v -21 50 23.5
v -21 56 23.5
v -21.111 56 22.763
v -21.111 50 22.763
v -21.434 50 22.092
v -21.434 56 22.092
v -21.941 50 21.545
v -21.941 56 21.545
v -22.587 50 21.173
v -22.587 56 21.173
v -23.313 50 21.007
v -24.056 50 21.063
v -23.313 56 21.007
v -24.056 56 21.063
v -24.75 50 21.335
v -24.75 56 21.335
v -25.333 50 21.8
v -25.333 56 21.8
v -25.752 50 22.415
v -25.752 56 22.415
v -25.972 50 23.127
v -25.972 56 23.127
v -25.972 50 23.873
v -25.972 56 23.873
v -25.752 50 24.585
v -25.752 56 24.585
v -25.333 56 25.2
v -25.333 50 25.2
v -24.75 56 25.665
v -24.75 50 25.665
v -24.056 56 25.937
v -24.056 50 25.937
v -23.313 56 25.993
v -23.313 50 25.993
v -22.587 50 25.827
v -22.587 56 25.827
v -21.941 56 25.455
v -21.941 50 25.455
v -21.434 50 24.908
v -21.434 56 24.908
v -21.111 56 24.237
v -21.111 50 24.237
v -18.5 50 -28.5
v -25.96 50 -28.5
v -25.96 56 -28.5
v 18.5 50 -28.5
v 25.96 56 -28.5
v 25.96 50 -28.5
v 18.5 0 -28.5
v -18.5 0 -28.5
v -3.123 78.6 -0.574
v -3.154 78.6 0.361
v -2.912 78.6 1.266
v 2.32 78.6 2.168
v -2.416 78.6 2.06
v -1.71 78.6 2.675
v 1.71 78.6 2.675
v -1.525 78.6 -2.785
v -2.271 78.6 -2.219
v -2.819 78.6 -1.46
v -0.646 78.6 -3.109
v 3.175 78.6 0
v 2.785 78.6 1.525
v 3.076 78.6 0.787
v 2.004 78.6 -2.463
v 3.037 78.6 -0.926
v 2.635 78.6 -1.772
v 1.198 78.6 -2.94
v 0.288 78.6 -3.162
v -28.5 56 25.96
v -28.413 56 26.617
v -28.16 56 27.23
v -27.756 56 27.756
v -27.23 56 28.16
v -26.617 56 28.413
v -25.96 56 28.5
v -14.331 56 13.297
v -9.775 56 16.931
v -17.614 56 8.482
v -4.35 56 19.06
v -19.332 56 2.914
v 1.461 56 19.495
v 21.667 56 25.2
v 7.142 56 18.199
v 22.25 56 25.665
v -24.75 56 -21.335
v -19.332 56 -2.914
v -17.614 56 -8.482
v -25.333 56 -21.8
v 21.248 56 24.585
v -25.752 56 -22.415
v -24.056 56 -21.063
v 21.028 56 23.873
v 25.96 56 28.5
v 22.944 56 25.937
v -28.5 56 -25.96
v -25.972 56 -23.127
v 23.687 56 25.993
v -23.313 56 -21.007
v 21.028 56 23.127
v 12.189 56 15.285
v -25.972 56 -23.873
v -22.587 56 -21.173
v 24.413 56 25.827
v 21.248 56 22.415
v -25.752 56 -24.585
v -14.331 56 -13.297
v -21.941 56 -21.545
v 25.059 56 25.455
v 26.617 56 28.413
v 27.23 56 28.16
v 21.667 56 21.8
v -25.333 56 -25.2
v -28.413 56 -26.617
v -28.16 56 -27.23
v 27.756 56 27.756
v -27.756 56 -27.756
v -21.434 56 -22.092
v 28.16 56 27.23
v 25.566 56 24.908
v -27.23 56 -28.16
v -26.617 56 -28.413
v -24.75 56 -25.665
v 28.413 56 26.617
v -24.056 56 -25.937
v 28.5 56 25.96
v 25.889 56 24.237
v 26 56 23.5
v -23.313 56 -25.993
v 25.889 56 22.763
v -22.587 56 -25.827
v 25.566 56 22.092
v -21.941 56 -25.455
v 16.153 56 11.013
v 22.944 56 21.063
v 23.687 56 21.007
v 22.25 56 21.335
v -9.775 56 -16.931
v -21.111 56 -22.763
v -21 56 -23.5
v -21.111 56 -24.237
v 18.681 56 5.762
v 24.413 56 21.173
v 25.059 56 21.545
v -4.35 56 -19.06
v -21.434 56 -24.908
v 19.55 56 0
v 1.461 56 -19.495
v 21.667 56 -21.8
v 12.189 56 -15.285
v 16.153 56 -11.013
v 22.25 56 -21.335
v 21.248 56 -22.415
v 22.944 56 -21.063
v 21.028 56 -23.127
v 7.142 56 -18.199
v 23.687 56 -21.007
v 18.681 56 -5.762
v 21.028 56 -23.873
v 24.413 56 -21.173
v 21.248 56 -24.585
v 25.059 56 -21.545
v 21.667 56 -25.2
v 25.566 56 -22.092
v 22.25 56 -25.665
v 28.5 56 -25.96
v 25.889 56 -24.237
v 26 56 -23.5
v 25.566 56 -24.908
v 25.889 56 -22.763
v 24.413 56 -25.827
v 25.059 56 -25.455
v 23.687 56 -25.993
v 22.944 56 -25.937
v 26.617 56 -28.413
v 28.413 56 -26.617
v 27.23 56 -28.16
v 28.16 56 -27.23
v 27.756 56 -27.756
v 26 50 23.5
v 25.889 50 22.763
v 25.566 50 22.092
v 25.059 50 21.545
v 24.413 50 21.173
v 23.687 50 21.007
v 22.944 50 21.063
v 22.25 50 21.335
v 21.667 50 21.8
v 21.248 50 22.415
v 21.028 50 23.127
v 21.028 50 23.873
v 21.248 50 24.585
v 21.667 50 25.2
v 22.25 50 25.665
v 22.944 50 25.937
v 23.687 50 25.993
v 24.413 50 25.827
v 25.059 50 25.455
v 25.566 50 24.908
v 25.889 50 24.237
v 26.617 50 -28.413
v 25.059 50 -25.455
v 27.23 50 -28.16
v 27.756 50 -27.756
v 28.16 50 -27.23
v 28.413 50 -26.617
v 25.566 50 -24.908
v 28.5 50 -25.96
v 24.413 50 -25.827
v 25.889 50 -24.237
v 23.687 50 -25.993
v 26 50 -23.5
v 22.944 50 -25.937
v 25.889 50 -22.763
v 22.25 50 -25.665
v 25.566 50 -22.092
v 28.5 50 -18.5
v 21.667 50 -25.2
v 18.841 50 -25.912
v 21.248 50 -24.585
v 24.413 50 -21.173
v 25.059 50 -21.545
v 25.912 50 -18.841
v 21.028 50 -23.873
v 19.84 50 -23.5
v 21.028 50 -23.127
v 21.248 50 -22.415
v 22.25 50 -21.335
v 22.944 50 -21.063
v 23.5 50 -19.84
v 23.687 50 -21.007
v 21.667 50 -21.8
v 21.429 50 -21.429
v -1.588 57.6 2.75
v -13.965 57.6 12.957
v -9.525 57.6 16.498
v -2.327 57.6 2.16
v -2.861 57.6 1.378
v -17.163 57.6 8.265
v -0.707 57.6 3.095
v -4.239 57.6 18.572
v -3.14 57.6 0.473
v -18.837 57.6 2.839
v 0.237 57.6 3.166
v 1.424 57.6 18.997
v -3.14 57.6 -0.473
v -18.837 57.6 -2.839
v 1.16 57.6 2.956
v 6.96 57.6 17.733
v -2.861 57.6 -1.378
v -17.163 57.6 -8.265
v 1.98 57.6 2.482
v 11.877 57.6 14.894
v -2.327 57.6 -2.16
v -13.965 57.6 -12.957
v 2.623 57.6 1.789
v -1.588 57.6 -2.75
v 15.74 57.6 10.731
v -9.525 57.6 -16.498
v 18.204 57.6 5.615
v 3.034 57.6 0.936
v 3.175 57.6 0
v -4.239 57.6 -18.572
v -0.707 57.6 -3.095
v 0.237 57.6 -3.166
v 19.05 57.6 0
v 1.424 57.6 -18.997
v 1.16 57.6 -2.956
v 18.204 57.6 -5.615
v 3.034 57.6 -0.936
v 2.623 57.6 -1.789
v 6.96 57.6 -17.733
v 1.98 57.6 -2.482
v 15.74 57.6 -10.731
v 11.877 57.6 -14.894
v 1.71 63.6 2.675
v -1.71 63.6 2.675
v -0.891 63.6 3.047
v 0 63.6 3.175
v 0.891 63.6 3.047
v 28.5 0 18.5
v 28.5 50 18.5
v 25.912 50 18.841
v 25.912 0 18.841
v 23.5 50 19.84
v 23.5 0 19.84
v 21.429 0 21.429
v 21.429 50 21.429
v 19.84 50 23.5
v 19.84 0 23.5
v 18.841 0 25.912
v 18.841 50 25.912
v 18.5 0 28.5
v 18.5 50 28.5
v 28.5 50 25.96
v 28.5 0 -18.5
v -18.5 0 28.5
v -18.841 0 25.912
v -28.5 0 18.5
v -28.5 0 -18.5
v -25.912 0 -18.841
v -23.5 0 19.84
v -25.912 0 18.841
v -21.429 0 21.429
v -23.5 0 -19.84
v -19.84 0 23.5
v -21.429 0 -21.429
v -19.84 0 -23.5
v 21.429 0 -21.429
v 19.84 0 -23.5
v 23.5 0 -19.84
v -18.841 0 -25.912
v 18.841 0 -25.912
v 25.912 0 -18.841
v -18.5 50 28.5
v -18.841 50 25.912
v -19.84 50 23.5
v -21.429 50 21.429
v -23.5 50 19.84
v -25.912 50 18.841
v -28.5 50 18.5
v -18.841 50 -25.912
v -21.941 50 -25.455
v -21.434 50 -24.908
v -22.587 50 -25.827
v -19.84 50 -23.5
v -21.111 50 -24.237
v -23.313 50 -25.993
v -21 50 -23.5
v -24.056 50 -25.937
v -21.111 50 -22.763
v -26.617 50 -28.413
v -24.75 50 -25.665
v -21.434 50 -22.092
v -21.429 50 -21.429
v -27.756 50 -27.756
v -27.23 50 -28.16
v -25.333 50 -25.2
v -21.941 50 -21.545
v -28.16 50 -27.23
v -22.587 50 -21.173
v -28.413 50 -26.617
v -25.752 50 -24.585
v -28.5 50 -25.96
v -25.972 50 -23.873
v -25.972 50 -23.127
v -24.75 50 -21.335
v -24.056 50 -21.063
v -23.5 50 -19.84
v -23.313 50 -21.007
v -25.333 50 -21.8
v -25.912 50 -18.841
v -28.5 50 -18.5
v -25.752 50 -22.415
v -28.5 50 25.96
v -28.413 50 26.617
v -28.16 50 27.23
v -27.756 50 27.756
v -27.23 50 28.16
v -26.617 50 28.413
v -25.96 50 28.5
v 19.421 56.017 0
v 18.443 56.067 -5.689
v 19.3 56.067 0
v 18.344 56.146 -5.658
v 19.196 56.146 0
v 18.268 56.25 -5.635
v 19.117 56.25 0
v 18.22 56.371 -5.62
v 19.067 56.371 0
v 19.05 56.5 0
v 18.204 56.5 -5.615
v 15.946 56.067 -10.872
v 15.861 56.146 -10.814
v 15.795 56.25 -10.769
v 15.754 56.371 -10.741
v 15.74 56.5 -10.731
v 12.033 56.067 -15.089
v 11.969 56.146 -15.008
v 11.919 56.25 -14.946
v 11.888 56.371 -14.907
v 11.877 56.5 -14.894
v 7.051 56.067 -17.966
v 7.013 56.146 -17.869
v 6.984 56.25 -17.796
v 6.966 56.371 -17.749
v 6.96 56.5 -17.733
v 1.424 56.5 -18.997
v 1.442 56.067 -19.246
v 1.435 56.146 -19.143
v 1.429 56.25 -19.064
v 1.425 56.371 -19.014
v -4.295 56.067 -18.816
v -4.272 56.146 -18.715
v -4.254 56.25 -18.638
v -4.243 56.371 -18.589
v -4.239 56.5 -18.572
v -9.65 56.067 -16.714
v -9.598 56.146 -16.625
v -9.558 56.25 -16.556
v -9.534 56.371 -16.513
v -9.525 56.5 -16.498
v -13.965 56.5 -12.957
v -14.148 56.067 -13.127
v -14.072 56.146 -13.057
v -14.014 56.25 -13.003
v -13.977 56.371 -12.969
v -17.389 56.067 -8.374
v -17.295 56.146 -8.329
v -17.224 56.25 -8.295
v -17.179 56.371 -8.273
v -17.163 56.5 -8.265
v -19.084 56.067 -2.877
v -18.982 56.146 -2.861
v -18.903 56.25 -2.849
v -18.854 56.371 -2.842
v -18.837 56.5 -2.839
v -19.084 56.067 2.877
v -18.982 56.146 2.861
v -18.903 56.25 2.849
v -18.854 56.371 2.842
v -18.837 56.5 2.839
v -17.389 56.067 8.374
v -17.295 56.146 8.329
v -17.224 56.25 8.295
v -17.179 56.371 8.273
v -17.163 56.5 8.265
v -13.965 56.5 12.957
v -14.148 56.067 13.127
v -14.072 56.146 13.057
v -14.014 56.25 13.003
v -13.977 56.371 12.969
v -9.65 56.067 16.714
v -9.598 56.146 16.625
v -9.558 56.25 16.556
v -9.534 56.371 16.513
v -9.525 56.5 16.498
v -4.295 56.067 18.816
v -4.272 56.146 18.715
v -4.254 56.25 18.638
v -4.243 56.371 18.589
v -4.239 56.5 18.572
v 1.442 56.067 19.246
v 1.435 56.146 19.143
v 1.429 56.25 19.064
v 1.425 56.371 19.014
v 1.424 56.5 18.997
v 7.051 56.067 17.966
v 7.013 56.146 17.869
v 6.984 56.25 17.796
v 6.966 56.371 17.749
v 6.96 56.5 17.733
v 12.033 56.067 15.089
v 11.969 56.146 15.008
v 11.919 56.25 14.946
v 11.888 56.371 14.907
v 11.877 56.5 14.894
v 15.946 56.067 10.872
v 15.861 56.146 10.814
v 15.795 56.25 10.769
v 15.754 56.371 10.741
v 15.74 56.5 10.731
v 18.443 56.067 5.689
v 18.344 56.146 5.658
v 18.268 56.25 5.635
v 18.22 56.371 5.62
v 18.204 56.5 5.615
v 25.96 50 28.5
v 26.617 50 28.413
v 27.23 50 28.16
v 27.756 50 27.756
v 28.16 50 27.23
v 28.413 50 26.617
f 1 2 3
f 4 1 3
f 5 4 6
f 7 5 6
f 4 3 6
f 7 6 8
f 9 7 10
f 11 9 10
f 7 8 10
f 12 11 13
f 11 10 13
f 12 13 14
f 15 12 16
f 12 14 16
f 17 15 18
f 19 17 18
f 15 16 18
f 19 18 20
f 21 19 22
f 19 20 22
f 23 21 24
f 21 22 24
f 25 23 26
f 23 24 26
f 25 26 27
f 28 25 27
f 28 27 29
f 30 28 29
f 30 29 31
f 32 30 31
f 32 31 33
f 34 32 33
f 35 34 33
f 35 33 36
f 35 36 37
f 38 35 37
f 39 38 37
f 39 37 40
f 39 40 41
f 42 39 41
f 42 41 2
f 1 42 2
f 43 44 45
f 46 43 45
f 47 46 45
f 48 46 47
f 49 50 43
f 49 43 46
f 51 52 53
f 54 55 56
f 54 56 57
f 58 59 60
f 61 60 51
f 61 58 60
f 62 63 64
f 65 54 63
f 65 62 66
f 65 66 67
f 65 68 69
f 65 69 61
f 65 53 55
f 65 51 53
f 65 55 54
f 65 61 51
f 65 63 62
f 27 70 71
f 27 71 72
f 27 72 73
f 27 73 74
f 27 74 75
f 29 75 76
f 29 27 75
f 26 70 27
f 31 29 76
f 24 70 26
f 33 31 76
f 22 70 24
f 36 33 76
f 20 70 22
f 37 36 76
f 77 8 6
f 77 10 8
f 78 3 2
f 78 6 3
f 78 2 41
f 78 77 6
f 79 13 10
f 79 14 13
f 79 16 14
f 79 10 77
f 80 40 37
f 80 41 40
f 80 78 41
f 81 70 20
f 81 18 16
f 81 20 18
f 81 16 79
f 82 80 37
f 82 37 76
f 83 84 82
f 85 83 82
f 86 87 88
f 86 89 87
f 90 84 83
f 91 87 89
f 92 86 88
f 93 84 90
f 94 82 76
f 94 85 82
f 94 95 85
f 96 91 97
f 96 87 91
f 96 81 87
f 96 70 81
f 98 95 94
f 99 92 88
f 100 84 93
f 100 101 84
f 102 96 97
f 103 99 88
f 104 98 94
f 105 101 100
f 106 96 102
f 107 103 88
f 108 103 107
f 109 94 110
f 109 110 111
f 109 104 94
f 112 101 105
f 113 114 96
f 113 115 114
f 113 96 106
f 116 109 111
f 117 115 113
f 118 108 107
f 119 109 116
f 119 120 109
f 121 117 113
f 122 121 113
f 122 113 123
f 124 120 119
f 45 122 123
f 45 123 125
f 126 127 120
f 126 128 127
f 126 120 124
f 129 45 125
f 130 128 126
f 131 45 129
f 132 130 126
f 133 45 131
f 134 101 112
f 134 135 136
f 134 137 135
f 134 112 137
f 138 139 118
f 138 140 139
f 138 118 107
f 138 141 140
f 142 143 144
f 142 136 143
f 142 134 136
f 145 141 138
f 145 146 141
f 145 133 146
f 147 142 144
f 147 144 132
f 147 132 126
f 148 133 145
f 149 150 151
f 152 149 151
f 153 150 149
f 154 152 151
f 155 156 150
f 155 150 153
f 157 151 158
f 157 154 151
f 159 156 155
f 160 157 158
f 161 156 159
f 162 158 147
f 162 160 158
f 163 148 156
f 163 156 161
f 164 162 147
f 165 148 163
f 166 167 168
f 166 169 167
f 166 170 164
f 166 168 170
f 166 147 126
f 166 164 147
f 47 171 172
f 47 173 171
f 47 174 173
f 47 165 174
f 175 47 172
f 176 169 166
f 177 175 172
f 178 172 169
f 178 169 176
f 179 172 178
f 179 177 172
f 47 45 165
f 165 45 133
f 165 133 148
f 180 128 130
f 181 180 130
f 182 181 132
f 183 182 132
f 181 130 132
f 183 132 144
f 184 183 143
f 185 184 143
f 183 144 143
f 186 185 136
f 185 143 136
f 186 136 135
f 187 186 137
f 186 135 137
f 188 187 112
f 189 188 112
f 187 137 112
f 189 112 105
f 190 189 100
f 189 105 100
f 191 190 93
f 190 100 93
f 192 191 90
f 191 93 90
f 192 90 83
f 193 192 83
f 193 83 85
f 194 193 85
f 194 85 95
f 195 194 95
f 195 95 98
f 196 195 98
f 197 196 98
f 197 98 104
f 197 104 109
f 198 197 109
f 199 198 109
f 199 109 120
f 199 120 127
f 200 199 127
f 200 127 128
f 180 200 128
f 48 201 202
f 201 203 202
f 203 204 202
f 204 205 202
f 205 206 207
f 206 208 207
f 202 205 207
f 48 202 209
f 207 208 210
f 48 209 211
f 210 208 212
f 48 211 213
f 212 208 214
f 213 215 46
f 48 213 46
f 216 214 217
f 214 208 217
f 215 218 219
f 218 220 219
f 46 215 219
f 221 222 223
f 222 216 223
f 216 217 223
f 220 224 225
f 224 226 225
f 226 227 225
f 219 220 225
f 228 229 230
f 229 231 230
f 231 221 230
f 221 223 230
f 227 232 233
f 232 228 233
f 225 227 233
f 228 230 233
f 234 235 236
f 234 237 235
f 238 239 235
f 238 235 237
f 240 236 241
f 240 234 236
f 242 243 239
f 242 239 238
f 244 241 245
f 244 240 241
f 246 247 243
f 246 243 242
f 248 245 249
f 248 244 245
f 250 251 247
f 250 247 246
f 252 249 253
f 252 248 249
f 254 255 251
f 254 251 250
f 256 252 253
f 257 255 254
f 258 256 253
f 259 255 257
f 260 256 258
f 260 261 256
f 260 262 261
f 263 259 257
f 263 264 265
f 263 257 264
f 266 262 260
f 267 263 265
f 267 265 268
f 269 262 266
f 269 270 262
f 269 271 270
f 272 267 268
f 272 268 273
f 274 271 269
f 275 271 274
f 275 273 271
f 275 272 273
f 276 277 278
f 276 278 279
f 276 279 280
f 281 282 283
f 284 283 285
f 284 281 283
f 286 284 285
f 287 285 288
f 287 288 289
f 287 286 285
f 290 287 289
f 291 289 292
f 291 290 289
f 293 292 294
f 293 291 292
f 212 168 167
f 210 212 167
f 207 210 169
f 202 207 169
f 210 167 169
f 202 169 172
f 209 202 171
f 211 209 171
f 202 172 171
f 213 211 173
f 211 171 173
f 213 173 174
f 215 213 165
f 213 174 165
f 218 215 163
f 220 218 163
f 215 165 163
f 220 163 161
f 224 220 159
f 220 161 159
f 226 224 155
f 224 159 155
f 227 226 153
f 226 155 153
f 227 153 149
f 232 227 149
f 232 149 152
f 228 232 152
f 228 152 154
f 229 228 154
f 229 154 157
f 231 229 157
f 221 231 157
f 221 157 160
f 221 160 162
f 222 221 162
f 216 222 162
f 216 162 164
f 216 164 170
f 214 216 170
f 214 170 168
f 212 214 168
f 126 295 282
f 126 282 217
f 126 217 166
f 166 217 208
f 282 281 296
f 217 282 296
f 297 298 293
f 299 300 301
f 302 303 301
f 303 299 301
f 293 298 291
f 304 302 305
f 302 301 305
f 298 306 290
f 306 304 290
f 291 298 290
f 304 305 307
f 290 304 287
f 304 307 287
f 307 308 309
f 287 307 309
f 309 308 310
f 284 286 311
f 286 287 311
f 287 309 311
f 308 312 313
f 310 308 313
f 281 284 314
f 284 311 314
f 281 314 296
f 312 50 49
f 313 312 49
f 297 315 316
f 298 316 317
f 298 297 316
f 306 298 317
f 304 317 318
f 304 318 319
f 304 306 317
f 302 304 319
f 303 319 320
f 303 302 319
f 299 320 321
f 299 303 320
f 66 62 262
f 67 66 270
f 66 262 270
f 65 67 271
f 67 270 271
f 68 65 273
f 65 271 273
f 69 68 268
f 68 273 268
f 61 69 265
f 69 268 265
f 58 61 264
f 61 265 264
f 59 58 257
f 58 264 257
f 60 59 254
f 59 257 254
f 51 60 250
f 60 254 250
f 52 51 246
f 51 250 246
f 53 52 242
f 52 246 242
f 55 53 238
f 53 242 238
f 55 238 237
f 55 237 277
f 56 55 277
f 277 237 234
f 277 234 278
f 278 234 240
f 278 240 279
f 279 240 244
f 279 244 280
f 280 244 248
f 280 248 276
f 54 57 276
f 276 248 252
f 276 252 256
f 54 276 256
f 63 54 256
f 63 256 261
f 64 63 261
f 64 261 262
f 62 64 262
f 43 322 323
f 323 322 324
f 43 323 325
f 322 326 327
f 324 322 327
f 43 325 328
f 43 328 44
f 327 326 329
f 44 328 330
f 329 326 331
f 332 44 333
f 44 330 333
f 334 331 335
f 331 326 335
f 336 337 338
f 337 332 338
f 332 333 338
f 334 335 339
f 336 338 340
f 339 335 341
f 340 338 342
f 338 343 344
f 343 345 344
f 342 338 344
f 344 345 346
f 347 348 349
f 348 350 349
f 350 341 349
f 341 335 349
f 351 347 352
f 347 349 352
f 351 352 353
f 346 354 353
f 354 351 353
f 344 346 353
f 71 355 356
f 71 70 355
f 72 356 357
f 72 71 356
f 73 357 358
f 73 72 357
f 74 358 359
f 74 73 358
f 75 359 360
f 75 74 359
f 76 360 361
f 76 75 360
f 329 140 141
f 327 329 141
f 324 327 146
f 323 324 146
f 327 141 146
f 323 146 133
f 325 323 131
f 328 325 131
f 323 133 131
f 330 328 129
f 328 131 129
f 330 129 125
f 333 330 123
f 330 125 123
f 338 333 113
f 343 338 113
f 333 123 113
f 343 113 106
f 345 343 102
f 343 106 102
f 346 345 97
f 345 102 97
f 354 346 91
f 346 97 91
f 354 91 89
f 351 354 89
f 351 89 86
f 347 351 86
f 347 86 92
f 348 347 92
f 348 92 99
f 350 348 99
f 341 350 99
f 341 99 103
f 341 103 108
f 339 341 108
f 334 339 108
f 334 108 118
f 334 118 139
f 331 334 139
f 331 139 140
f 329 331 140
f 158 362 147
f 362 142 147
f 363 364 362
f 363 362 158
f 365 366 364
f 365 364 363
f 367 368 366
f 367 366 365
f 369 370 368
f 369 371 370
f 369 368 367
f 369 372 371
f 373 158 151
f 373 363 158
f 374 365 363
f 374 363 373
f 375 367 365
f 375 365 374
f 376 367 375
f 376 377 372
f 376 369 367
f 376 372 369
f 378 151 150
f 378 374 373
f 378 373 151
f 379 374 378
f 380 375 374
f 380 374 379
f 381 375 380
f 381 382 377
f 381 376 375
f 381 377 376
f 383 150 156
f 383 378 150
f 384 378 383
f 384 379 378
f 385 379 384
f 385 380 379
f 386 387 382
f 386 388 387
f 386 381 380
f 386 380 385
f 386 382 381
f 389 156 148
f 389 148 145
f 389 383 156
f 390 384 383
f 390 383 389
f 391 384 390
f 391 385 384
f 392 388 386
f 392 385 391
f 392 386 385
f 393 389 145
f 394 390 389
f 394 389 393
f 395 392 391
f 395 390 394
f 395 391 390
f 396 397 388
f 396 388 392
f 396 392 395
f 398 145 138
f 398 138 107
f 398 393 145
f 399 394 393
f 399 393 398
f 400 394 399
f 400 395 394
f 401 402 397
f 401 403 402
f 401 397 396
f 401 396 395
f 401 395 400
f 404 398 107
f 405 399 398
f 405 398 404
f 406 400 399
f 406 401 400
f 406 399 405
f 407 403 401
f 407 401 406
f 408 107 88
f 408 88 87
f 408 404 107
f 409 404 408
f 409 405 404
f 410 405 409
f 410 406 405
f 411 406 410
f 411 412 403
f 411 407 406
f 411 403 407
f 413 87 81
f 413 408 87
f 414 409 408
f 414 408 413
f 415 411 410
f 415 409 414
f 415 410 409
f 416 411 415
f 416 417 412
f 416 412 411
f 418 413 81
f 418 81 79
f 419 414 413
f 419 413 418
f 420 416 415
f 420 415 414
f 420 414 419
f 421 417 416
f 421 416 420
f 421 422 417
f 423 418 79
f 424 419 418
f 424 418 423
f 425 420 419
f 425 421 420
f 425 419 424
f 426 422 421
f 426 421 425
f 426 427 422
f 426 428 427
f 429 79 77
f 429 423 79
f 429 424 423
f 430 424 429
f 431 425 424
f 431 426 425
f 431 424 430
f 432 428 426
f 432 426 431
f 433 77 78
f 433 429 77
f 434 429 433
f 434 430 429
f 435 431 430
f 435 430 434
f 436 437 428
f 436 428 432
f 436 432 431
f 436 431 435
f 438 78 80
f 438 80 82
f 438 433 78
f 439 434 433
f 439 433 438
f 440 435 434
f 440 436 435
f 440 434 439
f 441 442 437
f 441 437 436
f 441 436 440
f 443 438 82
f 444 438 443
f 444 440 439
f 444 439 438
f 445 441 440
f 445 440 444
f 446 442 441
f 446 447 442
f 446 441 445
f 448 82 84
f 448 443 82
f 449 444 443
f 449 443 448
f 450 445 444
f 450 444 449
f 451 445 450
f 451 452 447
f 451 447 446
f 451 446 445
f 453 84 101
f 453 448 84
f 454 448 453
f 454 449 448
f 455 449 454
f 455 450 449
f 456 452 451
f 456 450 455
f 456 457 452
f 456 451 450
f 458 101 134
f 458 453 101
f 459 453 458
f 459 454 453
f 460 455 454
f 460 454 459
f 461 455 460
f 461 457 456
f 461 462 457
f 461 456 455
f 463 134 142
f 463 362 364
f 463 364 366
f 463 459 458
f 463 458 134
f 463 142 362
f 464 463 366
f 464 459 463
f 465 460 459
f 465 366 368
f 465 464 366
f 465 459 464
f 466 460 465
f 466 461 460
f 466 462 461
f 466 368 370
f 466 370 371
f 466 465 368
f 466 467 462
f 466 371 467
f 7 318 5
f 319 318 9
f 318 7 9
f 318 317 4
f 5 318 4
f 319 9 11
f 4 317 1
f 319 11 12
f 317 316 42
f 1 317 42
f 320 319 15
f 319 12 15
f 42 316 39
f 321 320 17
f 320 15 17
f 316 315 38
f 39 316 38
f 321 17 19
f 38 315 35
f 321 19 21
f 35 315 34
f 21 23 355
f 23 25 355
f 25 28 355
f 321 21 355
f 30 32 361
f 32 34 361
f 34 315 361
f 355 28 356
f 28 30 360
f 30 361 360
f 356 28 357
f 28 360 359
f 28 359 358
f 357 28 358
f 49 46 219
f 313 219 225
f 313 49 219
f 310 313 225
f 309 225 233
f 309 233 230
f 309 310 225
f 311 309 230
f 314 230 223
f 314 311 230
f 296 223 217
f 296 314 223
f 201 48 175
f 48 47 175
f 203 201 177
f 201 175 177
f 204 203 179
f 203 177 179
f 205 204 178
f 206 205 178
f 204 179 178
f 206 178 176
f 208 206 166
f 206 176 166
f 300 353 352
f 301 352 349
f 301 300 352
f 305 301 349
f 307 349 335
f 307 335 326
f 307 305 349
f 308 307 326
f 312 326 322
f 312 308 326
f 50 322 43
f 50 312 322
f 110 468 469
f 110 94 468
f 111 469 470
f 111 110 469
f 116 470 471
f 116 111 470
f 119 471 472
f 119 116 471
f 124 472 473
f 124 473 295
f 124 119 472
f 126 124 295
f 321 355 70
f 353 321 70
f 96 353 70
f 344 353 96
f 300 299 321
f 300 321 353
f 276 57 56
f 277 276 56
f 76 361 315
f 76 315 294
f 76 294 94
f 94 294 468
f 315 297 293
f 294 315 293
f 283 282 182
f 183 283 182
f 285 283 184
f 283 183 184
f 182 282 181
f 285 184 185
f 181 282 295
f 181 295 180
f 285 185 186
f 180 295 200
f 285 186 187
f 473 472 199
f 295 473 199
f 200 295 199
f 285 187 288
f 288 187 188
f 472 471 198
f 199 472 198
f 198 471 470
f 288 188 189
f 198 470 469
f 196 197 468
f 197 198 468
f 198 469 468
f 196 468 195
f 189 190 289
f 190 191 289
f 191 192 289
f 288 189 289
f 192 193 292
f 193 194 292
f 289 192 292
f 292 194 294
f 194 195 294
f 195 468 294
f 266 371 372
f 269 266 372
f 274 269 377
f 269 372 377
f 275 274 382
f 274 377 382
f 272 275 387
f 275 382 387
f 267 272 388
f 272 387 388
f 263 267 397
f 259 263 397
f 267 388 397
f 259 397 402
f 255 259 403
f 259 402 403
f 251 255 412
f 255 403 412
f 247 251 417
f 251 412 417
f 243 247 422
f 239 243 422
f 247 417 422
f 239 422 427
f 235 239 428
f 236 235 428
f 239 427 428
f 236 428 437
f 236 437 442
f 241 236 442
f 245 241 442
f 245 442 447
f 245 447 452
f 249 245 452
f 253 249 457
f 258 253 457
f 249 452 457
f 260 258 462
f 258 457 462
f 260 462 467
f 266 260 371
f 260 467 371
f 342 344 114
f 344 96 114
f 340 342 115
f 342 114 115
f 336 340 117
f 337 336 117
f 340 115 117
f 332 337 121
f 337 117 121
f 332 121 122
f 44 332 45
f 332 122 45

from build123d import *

# Parameters (mm, degrees)
SKETCH1_W           = 57
SKETCH1_H           = 57
BOSS_EXTRUDE2_DEPTH = 56
CUT_EXTRUDE1_DEPTH  = 50
FILLET1_R           = 2.54
SKETCH3_R           = 2.499995
CUT_EXTRUDE2_DEPTH  = 25.4
SKETCH4_R           = 19.05
BOSS_EXTRUDE3_DEPTH = 1.6
FILLET2_R           = 0.5
SKETCH5_R           = 3.175
BOSS_EXTRUDE4_DEPTH = 21
CUT_EXTRUDE4_DEPTH  = 15


with BuildPart() as part:
    # Sketch1 → Boss-Extrude2 (new body)
    with BuildSketch(Plane(origin=(0, 0, 0), x_dir=(1, 0, 0), z_dir=(0, 1, 0))):
        Rectangle(SKETCH1_W, SKETCH1_H)
    extrude(amount=BOSS_EXTRUDE2_DEPTH)

    # Sketch2 → Cut-Extrude1 (cut)
    with BuildSketch(Plane.XZ):
        with BuildLine():
            Line((28.5, -18.5), (28.5, -28.5))
            Line((28.5, -28.5), (18.5, -28.5))
            ThreePointArc((18.5, -28.5), (21.428932188, -21.428932188), (28.5, -18.5))
        make_face()
        with BuildLine():
            Line((-28.5, -28.5), (-28.5, -18.5))
            ThreePointArc((-28.5, -18.5), (-21.428932188, -21.428932188), (-18.5, -28.5))
            Line((-18.5, -28.5), (-28.5, -28.5))
        make_face()
        with BuildLine():
            Line((-28.5, 28.5), (-18.5, 28.5))
            ThreePointArc((-18.5, 28.5), (-21.428932188, 21.428932188), (-28.5, 18.5))
            Line((-28.5, 18.5), (-28.5, 28.5))
        make_face()
        with BuildLine():
            Line((28.5, 28.5), (28.5, 18.5))
            ThreePointArc((28.5, 18.5), (21.428932188, 21.428932188), (18.5, 28.5))
            Line((18.5, 28.5), (28.5, 28.5))
        make_face()
    extrude(amount=-CUT_EXTRUDE1_DEPTH, mode=Mode.SUBTRACT)

    # Fillet1
    fillet1_edges = [part.edges().sort_by_distance(p)[0] for p in [
        (-28.5, 53, -28.5),
        (28.5, 53, -28.5),
        (28.5, 53, 28.5),
        (-28.5, 53, 28.5),
    ]]
    fillet(fillet1_edges, radius=FILLET1_R)

    # Sketch3 → Cut-Extrude2 (cut)
    with BuildSketch(Plane(origin=(0, 56, 0), x_dir=(1, 0, 0), z_dir=(0, 1, 0))):
        with Locations((-23.50001, -23.50001)):
            Circle(SKETCH3_R)
        with Locations((-23.50001, 23.50001)):
            Circle(SKETCH3_R)
        with Locations((23.50001, 23.50001)):
            Circle(SKETCH3_R)
        with Locations((23.50001, -23.50001)):
            Circle(SKETCH3_R)
    extrude(amount=-CUT_EXTRUDE2_DEPTH, mode=Mode.SUBTRACT)

    # Sketch4 → Boss-Extrude3 (add)
    with BuildSketch(Plane(origin=(0, 56, 0), x_dir=(1, 0, 0), z_dir=(0, 1, 0))):
        Circle(SKETCH4_R)
    extrude(amount=BOSS_EXTRUDE3_DEPTH)

    # Fillet2
    fillet2_edges = [part.edges().sort_by_distance(p)[0] for p in [
        (-19.05, 56, 0),
    ]]
    fillet(fillet2_edges, radius=FILLET2_R)

    # Sketch5 → Boss-Extrude4 (add)
    with BuildSketch(Plane(origin=(0, 57.6, 0), x_dir=(1, 0, 0), z_dir=(0, 1, 0))):
        Circle(SKETCH5_R)
    extrude(amount=BOSS_EXTRUDE4_DEPTH)

    # Sketch6 → Cut-Extrude4 (cut)
    with BuildSketch(Plane(origin=(0, 78.6, 0), x_dir=(1, 0, 0), z_dir=(0, 1, 0))):
        with BuildLine():
            Line((1.710263138, -2.675), (-1.710263138, -2.675))
            ThreePointArc((-1.710263138, -2.675), (0, -3.175), (1.710263138, -2.675))
        make_face()
    extrude(amount=-CUT_EXTRUDE4_DEPTH, mode=Mode.SUBTRACT)


solid = part.part
